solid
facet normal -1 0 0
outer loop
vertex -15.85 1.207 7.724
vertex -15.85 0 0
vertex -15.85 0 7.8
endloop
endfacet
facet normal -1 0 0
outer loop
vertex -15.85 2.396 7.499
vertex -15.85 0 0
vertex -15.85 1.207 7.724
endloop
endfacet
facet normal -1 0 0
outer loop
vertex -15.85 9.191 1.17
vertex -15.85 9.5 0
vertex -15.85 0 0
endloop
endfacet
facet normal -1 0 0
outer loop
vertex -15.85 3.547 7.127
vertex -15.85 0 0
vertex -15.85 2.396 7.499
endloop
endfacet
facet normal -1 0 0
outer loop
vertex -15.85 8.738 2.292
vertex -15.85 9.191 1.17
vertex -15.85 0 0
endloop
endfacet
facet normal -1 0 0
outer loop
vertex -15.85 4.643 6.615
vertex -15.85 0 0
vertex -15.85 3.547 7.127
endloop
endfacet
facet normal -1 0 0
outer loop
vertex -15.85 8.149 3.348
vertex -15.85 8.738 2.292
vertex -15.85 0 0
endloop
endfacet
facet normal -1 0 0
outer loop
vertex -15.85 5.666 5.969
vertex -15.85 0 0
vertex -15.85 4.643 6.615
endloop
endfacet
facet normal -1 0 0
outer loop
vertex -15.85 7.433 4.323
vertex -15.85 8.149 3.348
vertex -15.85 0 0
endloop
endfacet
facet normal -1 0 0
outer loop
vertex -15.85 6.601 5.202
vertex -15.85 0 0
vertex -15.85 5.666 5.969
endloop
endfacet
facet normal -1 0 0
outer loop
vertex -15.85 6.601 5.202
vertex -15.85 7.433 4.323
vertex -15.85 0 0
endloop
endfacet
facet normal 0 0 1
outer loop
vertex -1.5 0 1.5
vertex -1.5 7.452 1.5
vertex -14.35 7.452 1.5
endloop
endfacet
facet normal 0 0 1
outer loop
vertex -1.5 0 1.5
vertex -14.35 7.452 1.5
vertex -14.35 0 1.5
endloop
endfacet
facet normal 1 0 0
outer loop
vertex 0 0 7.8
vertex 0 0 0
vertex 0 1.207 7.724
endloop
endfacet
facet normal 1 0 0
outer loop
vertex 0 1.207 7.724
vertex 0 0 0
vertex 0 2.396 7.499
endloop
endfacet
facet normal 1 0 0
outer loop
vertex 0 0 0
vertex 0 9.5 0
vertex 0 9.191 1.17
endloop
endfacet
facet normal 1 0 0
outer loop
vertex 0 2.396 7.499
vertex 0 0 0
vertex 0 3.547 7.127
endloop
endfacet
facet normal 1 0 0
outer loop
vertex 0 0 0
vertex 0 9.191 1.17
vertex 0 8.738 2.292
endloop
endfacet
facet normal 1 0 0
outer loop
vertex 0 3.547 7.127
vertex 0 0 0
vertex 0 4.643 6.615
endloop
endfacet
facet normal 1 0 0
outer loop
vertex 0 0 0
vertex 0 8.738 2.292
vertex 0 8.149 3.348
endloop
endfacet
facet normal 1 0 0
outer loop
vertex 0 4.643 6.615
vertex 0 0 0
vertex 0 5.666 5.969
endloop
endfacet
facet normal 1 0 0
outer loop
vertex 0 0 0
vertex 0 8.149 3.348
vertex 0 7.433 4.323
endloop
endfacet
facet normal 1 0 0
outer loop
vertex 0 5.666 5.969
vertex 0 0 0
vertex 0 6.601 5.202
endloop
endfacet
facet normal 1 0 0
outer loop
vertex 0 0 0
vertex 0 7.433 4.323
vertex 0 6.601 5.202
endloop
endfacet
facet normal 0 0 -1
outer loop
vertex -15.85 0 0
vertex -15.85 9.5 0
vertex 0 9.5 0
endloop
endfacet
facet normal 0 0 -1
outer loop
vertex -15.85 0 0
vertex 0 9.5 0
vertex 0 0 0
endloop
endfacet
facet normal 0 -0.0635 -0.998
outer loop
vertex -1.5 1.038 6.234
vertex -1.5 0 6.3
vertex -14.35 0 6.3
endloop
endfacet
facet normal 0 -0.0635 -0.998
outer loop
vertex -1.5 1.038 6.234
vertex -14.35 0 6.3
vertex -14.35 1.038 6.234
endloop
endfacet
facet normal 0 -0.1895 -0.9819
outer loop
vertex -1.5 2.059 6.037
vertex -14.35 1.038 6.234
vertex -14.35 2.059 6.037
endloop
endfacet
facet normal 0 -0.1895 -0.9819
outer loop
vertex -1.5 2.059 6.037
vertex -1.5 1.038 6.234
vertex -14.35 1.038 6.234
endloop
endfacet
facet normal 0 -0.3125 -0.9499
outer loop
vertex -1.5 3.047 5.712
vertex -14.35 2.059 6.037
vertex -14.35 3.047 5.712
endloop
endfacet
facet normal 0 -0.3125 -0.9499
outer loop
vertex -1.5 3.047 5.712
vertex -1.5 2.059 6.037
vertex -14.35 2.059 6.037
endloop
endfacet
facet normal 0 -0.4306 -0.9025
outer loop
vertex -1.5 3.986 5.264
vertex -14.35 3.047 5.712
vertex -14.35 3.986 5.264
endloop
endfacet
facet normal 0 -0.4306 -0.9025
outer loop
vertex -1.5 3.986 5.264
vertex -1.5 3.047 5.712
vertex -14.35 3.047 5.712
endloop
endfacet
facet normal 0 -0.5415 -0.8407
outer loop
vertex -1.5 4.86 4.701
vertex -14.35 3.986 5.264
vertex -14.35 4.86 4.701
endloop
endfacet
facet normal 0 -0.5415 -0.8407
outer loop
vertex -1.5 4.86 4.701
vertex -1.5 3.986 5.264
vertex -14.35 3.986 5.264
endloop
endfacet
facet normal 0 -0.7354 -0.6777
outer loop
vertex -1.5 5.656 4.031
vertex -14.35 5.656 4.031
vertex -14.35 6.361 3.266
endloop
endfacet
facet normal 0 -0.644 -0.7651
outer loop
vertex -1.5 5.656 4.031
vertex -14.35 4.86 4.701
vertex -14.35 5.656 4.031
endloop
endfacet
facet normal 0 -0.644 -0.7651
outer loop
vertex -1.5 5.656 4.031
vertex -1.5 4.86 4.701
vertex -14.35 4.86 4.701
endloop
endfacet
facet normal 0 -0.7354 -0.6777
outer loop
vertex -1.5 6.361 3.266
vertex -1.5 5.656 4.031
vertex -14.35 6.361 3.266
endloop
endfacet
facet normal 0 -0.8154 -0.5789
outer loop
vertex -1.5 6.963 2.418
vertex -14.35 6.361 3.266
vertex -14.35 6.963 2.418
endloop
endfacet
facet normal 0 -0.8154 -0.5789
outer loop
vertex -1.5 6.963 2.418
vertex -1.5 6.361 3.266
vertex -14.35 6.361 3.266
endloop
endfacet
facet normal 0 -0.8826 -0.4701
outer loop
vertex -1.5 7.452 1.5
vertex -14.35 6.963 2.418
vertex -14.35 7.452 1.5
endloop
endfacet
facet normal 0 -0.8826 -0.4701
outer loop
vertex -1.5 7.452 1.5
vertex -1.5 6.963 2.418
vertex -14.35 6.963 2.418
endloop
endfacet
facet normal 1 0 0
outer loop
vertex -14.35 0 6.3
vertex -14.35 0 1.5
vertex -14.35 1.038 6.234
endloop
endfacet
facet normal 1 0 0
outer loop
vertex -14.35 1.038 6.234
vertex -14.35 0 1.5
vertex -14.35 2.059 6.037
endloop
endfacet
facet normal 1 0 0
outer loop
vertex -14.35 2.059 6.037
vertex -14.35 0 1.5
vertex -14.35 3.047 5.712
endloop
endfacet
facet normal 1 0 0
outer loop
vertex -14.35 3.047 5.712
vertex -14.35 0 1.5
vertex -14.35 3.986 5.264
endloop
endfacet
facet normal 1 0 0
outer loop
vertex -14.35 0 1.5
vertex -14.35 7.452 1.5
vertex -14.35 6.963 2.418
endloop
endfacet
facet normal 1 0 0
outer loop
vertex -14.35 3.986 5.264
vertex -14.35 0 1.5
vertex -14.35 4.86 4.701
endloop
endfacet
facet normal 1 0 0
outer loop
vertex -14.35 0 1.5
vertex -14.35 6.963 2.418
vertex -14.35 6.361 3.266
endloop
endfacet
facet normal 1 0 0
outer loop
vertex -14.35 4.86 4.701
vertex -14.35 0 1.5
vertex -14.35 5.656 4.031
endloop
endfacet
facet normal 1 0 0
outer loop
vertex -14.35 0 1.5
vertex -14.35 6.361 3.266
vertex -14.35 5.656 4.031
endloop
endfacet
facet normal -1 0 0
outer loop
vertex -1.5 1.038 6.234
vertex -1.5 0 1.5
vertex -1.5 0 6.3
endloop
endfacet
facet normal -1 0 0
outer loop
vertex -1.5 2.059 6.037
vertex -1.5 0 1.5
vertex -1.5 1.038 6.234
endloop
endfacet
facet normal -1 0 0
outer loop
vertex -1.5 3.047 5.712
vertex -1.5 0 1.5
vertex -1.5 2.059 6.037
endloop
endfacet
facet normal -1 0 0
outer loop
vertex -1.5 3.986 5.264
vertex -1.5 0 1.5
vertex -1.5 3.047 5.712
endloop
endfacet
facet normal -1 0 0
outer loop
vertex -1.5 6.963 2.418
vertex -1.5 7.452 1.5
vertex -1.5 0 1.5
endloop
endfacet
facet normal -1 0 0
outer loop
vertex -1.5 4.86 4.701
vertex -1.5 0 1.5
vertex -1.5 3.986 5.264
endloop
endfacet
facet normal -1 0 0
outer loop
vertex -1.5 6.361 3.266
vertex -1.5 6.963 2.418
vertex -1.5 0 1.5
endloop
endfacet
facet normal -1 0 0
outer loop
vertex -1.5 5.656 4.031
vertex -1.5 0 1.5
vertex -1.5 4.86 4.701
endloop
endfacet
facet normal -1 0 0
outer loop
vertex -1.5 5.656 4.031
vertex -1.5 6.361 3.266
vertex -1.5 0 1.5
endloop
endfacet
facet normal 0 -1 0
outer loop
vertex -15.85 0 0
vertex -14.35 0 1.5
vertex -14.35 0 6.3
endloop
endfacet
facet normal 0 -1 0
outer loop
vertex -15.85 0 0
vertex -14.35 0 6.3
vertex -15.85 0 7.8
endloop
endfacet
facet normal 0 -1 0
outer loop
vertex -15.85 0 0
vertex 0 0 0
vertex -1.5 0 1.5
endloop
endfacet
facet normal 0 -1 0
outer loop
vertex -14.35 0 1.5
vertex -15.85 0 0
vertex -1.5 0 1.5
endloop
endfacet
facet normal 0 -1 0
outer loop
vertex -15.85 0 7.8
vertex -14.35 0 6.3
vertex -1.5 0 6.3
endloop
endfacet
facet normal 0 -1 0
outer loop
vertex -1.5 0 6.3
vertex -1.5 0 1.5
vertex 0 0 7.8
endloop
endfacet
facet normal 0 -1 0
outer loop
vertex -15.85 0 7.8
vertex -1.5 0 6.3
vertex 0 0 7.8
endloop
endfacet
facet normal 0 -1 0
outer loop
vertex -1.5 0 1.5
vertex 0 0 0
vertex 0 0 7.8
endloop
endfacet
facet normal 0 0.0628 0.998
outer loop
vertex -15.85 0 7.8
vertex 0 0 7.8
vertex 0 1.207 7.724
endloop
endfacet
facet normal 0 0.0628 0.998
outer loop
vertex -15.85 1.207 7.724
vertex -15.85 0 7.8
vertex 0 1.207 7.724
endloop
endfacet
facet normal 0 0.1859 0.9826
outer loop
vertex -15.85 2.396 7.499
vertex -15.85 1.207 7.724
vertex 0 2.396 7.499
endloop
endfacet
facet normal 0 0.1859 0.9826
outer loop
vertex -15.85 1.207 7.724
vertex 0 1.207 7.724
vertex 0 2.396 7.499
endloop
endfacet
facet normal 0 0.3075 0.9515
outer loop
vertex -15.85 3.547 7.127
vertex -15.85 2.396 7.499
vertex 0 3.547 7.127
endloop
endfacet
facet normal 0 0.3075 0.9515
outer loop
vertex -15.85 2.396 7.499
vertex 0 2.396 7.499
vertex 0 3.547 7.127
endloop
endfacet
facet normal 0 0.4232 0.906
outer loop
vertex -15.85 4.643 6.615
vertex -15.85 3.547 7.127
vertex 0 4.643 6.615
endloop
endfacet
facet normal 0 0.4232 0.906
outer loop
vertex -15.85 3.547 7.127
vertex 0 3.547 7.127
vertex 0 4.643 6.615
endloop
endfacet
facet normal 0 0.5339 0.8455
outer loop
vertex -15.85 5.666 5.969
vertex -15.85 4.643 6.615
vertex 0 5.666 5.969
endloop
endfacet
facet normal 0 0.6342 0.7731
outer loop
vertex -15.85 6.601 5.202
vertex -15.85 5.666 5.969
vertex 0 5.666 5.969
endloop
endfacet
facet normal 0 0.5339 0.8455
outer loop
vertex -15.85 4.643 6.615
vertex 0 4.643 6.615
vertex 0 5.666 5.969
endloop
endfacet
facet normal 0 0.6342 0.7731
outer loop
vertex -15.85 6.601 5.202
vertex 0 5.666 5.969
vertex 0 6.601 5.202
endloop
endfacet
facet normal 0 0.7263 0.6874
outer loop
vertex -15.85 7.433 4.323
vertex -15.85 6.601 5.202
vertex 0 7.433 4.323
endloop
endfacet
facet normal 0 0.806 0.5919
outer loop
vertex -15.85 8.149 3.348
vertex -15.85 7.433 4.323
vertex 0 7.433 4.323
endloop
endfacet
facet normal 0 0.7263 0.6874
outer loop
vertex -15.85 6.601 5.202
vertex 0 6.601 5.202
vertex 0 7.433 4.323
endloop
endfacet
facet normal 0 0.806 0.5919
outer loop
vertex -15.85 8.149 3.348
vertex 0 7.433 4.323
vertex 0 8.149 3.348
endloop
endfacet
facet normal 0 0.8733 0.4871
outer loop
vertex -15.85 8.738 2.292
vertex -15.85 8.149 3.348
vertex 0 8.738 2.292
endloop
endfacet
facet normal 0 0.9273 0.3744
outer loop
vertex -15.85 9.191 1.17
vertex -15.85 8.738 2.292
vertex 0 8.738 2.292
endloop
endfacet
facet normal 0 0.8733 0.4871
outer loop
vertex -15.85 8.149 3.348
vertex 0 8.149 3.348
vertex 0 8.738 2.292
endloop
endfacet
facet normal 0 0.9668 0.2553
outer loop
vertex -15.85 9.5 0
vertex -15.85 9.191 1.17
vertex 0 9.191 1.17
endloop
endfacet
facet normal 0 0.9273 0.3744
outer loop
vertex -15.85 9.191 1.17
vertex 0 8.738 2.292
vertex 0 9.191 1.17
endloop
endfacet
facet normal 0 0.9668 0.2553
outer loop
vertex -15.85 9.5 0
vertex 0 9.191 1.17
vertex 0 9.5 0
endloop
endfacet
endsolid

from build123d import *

# Parameters (mm, degrees)
BOSS_EXTRUDE1_DEPTH = 15.85
SHELL1_T            = -1.5


with BuildPart() as part:
    # Sketch1 → Boss-Extrude1 (new body)
    with BuildSketch(Plane(origin=(0, 0, 0), x_dir=(0, 0, -1), z_dir=(1, 0, 0))):
        with BuildLine():
            Line((0, 9.5), (0, 0))
            Line((0, 0), (-7.8, 0))
            ThreePointArc((-7.8, 0), (-5.600175557, 6.145933615), (0, 9.5))
        make_face()
    extrude(amount=-BOSS_EXTRUDE1_DEPTH)

    # Shell1
    shell1_openings = [part.faces().sort_by_distance(p)[0] for p in [
        (-7.925, 0, 3.9),
    ]]
    offset(amount=SHELL1_T, openings=shell1_openings, kind=Kind.INTERSECTION)


solid = part.part
